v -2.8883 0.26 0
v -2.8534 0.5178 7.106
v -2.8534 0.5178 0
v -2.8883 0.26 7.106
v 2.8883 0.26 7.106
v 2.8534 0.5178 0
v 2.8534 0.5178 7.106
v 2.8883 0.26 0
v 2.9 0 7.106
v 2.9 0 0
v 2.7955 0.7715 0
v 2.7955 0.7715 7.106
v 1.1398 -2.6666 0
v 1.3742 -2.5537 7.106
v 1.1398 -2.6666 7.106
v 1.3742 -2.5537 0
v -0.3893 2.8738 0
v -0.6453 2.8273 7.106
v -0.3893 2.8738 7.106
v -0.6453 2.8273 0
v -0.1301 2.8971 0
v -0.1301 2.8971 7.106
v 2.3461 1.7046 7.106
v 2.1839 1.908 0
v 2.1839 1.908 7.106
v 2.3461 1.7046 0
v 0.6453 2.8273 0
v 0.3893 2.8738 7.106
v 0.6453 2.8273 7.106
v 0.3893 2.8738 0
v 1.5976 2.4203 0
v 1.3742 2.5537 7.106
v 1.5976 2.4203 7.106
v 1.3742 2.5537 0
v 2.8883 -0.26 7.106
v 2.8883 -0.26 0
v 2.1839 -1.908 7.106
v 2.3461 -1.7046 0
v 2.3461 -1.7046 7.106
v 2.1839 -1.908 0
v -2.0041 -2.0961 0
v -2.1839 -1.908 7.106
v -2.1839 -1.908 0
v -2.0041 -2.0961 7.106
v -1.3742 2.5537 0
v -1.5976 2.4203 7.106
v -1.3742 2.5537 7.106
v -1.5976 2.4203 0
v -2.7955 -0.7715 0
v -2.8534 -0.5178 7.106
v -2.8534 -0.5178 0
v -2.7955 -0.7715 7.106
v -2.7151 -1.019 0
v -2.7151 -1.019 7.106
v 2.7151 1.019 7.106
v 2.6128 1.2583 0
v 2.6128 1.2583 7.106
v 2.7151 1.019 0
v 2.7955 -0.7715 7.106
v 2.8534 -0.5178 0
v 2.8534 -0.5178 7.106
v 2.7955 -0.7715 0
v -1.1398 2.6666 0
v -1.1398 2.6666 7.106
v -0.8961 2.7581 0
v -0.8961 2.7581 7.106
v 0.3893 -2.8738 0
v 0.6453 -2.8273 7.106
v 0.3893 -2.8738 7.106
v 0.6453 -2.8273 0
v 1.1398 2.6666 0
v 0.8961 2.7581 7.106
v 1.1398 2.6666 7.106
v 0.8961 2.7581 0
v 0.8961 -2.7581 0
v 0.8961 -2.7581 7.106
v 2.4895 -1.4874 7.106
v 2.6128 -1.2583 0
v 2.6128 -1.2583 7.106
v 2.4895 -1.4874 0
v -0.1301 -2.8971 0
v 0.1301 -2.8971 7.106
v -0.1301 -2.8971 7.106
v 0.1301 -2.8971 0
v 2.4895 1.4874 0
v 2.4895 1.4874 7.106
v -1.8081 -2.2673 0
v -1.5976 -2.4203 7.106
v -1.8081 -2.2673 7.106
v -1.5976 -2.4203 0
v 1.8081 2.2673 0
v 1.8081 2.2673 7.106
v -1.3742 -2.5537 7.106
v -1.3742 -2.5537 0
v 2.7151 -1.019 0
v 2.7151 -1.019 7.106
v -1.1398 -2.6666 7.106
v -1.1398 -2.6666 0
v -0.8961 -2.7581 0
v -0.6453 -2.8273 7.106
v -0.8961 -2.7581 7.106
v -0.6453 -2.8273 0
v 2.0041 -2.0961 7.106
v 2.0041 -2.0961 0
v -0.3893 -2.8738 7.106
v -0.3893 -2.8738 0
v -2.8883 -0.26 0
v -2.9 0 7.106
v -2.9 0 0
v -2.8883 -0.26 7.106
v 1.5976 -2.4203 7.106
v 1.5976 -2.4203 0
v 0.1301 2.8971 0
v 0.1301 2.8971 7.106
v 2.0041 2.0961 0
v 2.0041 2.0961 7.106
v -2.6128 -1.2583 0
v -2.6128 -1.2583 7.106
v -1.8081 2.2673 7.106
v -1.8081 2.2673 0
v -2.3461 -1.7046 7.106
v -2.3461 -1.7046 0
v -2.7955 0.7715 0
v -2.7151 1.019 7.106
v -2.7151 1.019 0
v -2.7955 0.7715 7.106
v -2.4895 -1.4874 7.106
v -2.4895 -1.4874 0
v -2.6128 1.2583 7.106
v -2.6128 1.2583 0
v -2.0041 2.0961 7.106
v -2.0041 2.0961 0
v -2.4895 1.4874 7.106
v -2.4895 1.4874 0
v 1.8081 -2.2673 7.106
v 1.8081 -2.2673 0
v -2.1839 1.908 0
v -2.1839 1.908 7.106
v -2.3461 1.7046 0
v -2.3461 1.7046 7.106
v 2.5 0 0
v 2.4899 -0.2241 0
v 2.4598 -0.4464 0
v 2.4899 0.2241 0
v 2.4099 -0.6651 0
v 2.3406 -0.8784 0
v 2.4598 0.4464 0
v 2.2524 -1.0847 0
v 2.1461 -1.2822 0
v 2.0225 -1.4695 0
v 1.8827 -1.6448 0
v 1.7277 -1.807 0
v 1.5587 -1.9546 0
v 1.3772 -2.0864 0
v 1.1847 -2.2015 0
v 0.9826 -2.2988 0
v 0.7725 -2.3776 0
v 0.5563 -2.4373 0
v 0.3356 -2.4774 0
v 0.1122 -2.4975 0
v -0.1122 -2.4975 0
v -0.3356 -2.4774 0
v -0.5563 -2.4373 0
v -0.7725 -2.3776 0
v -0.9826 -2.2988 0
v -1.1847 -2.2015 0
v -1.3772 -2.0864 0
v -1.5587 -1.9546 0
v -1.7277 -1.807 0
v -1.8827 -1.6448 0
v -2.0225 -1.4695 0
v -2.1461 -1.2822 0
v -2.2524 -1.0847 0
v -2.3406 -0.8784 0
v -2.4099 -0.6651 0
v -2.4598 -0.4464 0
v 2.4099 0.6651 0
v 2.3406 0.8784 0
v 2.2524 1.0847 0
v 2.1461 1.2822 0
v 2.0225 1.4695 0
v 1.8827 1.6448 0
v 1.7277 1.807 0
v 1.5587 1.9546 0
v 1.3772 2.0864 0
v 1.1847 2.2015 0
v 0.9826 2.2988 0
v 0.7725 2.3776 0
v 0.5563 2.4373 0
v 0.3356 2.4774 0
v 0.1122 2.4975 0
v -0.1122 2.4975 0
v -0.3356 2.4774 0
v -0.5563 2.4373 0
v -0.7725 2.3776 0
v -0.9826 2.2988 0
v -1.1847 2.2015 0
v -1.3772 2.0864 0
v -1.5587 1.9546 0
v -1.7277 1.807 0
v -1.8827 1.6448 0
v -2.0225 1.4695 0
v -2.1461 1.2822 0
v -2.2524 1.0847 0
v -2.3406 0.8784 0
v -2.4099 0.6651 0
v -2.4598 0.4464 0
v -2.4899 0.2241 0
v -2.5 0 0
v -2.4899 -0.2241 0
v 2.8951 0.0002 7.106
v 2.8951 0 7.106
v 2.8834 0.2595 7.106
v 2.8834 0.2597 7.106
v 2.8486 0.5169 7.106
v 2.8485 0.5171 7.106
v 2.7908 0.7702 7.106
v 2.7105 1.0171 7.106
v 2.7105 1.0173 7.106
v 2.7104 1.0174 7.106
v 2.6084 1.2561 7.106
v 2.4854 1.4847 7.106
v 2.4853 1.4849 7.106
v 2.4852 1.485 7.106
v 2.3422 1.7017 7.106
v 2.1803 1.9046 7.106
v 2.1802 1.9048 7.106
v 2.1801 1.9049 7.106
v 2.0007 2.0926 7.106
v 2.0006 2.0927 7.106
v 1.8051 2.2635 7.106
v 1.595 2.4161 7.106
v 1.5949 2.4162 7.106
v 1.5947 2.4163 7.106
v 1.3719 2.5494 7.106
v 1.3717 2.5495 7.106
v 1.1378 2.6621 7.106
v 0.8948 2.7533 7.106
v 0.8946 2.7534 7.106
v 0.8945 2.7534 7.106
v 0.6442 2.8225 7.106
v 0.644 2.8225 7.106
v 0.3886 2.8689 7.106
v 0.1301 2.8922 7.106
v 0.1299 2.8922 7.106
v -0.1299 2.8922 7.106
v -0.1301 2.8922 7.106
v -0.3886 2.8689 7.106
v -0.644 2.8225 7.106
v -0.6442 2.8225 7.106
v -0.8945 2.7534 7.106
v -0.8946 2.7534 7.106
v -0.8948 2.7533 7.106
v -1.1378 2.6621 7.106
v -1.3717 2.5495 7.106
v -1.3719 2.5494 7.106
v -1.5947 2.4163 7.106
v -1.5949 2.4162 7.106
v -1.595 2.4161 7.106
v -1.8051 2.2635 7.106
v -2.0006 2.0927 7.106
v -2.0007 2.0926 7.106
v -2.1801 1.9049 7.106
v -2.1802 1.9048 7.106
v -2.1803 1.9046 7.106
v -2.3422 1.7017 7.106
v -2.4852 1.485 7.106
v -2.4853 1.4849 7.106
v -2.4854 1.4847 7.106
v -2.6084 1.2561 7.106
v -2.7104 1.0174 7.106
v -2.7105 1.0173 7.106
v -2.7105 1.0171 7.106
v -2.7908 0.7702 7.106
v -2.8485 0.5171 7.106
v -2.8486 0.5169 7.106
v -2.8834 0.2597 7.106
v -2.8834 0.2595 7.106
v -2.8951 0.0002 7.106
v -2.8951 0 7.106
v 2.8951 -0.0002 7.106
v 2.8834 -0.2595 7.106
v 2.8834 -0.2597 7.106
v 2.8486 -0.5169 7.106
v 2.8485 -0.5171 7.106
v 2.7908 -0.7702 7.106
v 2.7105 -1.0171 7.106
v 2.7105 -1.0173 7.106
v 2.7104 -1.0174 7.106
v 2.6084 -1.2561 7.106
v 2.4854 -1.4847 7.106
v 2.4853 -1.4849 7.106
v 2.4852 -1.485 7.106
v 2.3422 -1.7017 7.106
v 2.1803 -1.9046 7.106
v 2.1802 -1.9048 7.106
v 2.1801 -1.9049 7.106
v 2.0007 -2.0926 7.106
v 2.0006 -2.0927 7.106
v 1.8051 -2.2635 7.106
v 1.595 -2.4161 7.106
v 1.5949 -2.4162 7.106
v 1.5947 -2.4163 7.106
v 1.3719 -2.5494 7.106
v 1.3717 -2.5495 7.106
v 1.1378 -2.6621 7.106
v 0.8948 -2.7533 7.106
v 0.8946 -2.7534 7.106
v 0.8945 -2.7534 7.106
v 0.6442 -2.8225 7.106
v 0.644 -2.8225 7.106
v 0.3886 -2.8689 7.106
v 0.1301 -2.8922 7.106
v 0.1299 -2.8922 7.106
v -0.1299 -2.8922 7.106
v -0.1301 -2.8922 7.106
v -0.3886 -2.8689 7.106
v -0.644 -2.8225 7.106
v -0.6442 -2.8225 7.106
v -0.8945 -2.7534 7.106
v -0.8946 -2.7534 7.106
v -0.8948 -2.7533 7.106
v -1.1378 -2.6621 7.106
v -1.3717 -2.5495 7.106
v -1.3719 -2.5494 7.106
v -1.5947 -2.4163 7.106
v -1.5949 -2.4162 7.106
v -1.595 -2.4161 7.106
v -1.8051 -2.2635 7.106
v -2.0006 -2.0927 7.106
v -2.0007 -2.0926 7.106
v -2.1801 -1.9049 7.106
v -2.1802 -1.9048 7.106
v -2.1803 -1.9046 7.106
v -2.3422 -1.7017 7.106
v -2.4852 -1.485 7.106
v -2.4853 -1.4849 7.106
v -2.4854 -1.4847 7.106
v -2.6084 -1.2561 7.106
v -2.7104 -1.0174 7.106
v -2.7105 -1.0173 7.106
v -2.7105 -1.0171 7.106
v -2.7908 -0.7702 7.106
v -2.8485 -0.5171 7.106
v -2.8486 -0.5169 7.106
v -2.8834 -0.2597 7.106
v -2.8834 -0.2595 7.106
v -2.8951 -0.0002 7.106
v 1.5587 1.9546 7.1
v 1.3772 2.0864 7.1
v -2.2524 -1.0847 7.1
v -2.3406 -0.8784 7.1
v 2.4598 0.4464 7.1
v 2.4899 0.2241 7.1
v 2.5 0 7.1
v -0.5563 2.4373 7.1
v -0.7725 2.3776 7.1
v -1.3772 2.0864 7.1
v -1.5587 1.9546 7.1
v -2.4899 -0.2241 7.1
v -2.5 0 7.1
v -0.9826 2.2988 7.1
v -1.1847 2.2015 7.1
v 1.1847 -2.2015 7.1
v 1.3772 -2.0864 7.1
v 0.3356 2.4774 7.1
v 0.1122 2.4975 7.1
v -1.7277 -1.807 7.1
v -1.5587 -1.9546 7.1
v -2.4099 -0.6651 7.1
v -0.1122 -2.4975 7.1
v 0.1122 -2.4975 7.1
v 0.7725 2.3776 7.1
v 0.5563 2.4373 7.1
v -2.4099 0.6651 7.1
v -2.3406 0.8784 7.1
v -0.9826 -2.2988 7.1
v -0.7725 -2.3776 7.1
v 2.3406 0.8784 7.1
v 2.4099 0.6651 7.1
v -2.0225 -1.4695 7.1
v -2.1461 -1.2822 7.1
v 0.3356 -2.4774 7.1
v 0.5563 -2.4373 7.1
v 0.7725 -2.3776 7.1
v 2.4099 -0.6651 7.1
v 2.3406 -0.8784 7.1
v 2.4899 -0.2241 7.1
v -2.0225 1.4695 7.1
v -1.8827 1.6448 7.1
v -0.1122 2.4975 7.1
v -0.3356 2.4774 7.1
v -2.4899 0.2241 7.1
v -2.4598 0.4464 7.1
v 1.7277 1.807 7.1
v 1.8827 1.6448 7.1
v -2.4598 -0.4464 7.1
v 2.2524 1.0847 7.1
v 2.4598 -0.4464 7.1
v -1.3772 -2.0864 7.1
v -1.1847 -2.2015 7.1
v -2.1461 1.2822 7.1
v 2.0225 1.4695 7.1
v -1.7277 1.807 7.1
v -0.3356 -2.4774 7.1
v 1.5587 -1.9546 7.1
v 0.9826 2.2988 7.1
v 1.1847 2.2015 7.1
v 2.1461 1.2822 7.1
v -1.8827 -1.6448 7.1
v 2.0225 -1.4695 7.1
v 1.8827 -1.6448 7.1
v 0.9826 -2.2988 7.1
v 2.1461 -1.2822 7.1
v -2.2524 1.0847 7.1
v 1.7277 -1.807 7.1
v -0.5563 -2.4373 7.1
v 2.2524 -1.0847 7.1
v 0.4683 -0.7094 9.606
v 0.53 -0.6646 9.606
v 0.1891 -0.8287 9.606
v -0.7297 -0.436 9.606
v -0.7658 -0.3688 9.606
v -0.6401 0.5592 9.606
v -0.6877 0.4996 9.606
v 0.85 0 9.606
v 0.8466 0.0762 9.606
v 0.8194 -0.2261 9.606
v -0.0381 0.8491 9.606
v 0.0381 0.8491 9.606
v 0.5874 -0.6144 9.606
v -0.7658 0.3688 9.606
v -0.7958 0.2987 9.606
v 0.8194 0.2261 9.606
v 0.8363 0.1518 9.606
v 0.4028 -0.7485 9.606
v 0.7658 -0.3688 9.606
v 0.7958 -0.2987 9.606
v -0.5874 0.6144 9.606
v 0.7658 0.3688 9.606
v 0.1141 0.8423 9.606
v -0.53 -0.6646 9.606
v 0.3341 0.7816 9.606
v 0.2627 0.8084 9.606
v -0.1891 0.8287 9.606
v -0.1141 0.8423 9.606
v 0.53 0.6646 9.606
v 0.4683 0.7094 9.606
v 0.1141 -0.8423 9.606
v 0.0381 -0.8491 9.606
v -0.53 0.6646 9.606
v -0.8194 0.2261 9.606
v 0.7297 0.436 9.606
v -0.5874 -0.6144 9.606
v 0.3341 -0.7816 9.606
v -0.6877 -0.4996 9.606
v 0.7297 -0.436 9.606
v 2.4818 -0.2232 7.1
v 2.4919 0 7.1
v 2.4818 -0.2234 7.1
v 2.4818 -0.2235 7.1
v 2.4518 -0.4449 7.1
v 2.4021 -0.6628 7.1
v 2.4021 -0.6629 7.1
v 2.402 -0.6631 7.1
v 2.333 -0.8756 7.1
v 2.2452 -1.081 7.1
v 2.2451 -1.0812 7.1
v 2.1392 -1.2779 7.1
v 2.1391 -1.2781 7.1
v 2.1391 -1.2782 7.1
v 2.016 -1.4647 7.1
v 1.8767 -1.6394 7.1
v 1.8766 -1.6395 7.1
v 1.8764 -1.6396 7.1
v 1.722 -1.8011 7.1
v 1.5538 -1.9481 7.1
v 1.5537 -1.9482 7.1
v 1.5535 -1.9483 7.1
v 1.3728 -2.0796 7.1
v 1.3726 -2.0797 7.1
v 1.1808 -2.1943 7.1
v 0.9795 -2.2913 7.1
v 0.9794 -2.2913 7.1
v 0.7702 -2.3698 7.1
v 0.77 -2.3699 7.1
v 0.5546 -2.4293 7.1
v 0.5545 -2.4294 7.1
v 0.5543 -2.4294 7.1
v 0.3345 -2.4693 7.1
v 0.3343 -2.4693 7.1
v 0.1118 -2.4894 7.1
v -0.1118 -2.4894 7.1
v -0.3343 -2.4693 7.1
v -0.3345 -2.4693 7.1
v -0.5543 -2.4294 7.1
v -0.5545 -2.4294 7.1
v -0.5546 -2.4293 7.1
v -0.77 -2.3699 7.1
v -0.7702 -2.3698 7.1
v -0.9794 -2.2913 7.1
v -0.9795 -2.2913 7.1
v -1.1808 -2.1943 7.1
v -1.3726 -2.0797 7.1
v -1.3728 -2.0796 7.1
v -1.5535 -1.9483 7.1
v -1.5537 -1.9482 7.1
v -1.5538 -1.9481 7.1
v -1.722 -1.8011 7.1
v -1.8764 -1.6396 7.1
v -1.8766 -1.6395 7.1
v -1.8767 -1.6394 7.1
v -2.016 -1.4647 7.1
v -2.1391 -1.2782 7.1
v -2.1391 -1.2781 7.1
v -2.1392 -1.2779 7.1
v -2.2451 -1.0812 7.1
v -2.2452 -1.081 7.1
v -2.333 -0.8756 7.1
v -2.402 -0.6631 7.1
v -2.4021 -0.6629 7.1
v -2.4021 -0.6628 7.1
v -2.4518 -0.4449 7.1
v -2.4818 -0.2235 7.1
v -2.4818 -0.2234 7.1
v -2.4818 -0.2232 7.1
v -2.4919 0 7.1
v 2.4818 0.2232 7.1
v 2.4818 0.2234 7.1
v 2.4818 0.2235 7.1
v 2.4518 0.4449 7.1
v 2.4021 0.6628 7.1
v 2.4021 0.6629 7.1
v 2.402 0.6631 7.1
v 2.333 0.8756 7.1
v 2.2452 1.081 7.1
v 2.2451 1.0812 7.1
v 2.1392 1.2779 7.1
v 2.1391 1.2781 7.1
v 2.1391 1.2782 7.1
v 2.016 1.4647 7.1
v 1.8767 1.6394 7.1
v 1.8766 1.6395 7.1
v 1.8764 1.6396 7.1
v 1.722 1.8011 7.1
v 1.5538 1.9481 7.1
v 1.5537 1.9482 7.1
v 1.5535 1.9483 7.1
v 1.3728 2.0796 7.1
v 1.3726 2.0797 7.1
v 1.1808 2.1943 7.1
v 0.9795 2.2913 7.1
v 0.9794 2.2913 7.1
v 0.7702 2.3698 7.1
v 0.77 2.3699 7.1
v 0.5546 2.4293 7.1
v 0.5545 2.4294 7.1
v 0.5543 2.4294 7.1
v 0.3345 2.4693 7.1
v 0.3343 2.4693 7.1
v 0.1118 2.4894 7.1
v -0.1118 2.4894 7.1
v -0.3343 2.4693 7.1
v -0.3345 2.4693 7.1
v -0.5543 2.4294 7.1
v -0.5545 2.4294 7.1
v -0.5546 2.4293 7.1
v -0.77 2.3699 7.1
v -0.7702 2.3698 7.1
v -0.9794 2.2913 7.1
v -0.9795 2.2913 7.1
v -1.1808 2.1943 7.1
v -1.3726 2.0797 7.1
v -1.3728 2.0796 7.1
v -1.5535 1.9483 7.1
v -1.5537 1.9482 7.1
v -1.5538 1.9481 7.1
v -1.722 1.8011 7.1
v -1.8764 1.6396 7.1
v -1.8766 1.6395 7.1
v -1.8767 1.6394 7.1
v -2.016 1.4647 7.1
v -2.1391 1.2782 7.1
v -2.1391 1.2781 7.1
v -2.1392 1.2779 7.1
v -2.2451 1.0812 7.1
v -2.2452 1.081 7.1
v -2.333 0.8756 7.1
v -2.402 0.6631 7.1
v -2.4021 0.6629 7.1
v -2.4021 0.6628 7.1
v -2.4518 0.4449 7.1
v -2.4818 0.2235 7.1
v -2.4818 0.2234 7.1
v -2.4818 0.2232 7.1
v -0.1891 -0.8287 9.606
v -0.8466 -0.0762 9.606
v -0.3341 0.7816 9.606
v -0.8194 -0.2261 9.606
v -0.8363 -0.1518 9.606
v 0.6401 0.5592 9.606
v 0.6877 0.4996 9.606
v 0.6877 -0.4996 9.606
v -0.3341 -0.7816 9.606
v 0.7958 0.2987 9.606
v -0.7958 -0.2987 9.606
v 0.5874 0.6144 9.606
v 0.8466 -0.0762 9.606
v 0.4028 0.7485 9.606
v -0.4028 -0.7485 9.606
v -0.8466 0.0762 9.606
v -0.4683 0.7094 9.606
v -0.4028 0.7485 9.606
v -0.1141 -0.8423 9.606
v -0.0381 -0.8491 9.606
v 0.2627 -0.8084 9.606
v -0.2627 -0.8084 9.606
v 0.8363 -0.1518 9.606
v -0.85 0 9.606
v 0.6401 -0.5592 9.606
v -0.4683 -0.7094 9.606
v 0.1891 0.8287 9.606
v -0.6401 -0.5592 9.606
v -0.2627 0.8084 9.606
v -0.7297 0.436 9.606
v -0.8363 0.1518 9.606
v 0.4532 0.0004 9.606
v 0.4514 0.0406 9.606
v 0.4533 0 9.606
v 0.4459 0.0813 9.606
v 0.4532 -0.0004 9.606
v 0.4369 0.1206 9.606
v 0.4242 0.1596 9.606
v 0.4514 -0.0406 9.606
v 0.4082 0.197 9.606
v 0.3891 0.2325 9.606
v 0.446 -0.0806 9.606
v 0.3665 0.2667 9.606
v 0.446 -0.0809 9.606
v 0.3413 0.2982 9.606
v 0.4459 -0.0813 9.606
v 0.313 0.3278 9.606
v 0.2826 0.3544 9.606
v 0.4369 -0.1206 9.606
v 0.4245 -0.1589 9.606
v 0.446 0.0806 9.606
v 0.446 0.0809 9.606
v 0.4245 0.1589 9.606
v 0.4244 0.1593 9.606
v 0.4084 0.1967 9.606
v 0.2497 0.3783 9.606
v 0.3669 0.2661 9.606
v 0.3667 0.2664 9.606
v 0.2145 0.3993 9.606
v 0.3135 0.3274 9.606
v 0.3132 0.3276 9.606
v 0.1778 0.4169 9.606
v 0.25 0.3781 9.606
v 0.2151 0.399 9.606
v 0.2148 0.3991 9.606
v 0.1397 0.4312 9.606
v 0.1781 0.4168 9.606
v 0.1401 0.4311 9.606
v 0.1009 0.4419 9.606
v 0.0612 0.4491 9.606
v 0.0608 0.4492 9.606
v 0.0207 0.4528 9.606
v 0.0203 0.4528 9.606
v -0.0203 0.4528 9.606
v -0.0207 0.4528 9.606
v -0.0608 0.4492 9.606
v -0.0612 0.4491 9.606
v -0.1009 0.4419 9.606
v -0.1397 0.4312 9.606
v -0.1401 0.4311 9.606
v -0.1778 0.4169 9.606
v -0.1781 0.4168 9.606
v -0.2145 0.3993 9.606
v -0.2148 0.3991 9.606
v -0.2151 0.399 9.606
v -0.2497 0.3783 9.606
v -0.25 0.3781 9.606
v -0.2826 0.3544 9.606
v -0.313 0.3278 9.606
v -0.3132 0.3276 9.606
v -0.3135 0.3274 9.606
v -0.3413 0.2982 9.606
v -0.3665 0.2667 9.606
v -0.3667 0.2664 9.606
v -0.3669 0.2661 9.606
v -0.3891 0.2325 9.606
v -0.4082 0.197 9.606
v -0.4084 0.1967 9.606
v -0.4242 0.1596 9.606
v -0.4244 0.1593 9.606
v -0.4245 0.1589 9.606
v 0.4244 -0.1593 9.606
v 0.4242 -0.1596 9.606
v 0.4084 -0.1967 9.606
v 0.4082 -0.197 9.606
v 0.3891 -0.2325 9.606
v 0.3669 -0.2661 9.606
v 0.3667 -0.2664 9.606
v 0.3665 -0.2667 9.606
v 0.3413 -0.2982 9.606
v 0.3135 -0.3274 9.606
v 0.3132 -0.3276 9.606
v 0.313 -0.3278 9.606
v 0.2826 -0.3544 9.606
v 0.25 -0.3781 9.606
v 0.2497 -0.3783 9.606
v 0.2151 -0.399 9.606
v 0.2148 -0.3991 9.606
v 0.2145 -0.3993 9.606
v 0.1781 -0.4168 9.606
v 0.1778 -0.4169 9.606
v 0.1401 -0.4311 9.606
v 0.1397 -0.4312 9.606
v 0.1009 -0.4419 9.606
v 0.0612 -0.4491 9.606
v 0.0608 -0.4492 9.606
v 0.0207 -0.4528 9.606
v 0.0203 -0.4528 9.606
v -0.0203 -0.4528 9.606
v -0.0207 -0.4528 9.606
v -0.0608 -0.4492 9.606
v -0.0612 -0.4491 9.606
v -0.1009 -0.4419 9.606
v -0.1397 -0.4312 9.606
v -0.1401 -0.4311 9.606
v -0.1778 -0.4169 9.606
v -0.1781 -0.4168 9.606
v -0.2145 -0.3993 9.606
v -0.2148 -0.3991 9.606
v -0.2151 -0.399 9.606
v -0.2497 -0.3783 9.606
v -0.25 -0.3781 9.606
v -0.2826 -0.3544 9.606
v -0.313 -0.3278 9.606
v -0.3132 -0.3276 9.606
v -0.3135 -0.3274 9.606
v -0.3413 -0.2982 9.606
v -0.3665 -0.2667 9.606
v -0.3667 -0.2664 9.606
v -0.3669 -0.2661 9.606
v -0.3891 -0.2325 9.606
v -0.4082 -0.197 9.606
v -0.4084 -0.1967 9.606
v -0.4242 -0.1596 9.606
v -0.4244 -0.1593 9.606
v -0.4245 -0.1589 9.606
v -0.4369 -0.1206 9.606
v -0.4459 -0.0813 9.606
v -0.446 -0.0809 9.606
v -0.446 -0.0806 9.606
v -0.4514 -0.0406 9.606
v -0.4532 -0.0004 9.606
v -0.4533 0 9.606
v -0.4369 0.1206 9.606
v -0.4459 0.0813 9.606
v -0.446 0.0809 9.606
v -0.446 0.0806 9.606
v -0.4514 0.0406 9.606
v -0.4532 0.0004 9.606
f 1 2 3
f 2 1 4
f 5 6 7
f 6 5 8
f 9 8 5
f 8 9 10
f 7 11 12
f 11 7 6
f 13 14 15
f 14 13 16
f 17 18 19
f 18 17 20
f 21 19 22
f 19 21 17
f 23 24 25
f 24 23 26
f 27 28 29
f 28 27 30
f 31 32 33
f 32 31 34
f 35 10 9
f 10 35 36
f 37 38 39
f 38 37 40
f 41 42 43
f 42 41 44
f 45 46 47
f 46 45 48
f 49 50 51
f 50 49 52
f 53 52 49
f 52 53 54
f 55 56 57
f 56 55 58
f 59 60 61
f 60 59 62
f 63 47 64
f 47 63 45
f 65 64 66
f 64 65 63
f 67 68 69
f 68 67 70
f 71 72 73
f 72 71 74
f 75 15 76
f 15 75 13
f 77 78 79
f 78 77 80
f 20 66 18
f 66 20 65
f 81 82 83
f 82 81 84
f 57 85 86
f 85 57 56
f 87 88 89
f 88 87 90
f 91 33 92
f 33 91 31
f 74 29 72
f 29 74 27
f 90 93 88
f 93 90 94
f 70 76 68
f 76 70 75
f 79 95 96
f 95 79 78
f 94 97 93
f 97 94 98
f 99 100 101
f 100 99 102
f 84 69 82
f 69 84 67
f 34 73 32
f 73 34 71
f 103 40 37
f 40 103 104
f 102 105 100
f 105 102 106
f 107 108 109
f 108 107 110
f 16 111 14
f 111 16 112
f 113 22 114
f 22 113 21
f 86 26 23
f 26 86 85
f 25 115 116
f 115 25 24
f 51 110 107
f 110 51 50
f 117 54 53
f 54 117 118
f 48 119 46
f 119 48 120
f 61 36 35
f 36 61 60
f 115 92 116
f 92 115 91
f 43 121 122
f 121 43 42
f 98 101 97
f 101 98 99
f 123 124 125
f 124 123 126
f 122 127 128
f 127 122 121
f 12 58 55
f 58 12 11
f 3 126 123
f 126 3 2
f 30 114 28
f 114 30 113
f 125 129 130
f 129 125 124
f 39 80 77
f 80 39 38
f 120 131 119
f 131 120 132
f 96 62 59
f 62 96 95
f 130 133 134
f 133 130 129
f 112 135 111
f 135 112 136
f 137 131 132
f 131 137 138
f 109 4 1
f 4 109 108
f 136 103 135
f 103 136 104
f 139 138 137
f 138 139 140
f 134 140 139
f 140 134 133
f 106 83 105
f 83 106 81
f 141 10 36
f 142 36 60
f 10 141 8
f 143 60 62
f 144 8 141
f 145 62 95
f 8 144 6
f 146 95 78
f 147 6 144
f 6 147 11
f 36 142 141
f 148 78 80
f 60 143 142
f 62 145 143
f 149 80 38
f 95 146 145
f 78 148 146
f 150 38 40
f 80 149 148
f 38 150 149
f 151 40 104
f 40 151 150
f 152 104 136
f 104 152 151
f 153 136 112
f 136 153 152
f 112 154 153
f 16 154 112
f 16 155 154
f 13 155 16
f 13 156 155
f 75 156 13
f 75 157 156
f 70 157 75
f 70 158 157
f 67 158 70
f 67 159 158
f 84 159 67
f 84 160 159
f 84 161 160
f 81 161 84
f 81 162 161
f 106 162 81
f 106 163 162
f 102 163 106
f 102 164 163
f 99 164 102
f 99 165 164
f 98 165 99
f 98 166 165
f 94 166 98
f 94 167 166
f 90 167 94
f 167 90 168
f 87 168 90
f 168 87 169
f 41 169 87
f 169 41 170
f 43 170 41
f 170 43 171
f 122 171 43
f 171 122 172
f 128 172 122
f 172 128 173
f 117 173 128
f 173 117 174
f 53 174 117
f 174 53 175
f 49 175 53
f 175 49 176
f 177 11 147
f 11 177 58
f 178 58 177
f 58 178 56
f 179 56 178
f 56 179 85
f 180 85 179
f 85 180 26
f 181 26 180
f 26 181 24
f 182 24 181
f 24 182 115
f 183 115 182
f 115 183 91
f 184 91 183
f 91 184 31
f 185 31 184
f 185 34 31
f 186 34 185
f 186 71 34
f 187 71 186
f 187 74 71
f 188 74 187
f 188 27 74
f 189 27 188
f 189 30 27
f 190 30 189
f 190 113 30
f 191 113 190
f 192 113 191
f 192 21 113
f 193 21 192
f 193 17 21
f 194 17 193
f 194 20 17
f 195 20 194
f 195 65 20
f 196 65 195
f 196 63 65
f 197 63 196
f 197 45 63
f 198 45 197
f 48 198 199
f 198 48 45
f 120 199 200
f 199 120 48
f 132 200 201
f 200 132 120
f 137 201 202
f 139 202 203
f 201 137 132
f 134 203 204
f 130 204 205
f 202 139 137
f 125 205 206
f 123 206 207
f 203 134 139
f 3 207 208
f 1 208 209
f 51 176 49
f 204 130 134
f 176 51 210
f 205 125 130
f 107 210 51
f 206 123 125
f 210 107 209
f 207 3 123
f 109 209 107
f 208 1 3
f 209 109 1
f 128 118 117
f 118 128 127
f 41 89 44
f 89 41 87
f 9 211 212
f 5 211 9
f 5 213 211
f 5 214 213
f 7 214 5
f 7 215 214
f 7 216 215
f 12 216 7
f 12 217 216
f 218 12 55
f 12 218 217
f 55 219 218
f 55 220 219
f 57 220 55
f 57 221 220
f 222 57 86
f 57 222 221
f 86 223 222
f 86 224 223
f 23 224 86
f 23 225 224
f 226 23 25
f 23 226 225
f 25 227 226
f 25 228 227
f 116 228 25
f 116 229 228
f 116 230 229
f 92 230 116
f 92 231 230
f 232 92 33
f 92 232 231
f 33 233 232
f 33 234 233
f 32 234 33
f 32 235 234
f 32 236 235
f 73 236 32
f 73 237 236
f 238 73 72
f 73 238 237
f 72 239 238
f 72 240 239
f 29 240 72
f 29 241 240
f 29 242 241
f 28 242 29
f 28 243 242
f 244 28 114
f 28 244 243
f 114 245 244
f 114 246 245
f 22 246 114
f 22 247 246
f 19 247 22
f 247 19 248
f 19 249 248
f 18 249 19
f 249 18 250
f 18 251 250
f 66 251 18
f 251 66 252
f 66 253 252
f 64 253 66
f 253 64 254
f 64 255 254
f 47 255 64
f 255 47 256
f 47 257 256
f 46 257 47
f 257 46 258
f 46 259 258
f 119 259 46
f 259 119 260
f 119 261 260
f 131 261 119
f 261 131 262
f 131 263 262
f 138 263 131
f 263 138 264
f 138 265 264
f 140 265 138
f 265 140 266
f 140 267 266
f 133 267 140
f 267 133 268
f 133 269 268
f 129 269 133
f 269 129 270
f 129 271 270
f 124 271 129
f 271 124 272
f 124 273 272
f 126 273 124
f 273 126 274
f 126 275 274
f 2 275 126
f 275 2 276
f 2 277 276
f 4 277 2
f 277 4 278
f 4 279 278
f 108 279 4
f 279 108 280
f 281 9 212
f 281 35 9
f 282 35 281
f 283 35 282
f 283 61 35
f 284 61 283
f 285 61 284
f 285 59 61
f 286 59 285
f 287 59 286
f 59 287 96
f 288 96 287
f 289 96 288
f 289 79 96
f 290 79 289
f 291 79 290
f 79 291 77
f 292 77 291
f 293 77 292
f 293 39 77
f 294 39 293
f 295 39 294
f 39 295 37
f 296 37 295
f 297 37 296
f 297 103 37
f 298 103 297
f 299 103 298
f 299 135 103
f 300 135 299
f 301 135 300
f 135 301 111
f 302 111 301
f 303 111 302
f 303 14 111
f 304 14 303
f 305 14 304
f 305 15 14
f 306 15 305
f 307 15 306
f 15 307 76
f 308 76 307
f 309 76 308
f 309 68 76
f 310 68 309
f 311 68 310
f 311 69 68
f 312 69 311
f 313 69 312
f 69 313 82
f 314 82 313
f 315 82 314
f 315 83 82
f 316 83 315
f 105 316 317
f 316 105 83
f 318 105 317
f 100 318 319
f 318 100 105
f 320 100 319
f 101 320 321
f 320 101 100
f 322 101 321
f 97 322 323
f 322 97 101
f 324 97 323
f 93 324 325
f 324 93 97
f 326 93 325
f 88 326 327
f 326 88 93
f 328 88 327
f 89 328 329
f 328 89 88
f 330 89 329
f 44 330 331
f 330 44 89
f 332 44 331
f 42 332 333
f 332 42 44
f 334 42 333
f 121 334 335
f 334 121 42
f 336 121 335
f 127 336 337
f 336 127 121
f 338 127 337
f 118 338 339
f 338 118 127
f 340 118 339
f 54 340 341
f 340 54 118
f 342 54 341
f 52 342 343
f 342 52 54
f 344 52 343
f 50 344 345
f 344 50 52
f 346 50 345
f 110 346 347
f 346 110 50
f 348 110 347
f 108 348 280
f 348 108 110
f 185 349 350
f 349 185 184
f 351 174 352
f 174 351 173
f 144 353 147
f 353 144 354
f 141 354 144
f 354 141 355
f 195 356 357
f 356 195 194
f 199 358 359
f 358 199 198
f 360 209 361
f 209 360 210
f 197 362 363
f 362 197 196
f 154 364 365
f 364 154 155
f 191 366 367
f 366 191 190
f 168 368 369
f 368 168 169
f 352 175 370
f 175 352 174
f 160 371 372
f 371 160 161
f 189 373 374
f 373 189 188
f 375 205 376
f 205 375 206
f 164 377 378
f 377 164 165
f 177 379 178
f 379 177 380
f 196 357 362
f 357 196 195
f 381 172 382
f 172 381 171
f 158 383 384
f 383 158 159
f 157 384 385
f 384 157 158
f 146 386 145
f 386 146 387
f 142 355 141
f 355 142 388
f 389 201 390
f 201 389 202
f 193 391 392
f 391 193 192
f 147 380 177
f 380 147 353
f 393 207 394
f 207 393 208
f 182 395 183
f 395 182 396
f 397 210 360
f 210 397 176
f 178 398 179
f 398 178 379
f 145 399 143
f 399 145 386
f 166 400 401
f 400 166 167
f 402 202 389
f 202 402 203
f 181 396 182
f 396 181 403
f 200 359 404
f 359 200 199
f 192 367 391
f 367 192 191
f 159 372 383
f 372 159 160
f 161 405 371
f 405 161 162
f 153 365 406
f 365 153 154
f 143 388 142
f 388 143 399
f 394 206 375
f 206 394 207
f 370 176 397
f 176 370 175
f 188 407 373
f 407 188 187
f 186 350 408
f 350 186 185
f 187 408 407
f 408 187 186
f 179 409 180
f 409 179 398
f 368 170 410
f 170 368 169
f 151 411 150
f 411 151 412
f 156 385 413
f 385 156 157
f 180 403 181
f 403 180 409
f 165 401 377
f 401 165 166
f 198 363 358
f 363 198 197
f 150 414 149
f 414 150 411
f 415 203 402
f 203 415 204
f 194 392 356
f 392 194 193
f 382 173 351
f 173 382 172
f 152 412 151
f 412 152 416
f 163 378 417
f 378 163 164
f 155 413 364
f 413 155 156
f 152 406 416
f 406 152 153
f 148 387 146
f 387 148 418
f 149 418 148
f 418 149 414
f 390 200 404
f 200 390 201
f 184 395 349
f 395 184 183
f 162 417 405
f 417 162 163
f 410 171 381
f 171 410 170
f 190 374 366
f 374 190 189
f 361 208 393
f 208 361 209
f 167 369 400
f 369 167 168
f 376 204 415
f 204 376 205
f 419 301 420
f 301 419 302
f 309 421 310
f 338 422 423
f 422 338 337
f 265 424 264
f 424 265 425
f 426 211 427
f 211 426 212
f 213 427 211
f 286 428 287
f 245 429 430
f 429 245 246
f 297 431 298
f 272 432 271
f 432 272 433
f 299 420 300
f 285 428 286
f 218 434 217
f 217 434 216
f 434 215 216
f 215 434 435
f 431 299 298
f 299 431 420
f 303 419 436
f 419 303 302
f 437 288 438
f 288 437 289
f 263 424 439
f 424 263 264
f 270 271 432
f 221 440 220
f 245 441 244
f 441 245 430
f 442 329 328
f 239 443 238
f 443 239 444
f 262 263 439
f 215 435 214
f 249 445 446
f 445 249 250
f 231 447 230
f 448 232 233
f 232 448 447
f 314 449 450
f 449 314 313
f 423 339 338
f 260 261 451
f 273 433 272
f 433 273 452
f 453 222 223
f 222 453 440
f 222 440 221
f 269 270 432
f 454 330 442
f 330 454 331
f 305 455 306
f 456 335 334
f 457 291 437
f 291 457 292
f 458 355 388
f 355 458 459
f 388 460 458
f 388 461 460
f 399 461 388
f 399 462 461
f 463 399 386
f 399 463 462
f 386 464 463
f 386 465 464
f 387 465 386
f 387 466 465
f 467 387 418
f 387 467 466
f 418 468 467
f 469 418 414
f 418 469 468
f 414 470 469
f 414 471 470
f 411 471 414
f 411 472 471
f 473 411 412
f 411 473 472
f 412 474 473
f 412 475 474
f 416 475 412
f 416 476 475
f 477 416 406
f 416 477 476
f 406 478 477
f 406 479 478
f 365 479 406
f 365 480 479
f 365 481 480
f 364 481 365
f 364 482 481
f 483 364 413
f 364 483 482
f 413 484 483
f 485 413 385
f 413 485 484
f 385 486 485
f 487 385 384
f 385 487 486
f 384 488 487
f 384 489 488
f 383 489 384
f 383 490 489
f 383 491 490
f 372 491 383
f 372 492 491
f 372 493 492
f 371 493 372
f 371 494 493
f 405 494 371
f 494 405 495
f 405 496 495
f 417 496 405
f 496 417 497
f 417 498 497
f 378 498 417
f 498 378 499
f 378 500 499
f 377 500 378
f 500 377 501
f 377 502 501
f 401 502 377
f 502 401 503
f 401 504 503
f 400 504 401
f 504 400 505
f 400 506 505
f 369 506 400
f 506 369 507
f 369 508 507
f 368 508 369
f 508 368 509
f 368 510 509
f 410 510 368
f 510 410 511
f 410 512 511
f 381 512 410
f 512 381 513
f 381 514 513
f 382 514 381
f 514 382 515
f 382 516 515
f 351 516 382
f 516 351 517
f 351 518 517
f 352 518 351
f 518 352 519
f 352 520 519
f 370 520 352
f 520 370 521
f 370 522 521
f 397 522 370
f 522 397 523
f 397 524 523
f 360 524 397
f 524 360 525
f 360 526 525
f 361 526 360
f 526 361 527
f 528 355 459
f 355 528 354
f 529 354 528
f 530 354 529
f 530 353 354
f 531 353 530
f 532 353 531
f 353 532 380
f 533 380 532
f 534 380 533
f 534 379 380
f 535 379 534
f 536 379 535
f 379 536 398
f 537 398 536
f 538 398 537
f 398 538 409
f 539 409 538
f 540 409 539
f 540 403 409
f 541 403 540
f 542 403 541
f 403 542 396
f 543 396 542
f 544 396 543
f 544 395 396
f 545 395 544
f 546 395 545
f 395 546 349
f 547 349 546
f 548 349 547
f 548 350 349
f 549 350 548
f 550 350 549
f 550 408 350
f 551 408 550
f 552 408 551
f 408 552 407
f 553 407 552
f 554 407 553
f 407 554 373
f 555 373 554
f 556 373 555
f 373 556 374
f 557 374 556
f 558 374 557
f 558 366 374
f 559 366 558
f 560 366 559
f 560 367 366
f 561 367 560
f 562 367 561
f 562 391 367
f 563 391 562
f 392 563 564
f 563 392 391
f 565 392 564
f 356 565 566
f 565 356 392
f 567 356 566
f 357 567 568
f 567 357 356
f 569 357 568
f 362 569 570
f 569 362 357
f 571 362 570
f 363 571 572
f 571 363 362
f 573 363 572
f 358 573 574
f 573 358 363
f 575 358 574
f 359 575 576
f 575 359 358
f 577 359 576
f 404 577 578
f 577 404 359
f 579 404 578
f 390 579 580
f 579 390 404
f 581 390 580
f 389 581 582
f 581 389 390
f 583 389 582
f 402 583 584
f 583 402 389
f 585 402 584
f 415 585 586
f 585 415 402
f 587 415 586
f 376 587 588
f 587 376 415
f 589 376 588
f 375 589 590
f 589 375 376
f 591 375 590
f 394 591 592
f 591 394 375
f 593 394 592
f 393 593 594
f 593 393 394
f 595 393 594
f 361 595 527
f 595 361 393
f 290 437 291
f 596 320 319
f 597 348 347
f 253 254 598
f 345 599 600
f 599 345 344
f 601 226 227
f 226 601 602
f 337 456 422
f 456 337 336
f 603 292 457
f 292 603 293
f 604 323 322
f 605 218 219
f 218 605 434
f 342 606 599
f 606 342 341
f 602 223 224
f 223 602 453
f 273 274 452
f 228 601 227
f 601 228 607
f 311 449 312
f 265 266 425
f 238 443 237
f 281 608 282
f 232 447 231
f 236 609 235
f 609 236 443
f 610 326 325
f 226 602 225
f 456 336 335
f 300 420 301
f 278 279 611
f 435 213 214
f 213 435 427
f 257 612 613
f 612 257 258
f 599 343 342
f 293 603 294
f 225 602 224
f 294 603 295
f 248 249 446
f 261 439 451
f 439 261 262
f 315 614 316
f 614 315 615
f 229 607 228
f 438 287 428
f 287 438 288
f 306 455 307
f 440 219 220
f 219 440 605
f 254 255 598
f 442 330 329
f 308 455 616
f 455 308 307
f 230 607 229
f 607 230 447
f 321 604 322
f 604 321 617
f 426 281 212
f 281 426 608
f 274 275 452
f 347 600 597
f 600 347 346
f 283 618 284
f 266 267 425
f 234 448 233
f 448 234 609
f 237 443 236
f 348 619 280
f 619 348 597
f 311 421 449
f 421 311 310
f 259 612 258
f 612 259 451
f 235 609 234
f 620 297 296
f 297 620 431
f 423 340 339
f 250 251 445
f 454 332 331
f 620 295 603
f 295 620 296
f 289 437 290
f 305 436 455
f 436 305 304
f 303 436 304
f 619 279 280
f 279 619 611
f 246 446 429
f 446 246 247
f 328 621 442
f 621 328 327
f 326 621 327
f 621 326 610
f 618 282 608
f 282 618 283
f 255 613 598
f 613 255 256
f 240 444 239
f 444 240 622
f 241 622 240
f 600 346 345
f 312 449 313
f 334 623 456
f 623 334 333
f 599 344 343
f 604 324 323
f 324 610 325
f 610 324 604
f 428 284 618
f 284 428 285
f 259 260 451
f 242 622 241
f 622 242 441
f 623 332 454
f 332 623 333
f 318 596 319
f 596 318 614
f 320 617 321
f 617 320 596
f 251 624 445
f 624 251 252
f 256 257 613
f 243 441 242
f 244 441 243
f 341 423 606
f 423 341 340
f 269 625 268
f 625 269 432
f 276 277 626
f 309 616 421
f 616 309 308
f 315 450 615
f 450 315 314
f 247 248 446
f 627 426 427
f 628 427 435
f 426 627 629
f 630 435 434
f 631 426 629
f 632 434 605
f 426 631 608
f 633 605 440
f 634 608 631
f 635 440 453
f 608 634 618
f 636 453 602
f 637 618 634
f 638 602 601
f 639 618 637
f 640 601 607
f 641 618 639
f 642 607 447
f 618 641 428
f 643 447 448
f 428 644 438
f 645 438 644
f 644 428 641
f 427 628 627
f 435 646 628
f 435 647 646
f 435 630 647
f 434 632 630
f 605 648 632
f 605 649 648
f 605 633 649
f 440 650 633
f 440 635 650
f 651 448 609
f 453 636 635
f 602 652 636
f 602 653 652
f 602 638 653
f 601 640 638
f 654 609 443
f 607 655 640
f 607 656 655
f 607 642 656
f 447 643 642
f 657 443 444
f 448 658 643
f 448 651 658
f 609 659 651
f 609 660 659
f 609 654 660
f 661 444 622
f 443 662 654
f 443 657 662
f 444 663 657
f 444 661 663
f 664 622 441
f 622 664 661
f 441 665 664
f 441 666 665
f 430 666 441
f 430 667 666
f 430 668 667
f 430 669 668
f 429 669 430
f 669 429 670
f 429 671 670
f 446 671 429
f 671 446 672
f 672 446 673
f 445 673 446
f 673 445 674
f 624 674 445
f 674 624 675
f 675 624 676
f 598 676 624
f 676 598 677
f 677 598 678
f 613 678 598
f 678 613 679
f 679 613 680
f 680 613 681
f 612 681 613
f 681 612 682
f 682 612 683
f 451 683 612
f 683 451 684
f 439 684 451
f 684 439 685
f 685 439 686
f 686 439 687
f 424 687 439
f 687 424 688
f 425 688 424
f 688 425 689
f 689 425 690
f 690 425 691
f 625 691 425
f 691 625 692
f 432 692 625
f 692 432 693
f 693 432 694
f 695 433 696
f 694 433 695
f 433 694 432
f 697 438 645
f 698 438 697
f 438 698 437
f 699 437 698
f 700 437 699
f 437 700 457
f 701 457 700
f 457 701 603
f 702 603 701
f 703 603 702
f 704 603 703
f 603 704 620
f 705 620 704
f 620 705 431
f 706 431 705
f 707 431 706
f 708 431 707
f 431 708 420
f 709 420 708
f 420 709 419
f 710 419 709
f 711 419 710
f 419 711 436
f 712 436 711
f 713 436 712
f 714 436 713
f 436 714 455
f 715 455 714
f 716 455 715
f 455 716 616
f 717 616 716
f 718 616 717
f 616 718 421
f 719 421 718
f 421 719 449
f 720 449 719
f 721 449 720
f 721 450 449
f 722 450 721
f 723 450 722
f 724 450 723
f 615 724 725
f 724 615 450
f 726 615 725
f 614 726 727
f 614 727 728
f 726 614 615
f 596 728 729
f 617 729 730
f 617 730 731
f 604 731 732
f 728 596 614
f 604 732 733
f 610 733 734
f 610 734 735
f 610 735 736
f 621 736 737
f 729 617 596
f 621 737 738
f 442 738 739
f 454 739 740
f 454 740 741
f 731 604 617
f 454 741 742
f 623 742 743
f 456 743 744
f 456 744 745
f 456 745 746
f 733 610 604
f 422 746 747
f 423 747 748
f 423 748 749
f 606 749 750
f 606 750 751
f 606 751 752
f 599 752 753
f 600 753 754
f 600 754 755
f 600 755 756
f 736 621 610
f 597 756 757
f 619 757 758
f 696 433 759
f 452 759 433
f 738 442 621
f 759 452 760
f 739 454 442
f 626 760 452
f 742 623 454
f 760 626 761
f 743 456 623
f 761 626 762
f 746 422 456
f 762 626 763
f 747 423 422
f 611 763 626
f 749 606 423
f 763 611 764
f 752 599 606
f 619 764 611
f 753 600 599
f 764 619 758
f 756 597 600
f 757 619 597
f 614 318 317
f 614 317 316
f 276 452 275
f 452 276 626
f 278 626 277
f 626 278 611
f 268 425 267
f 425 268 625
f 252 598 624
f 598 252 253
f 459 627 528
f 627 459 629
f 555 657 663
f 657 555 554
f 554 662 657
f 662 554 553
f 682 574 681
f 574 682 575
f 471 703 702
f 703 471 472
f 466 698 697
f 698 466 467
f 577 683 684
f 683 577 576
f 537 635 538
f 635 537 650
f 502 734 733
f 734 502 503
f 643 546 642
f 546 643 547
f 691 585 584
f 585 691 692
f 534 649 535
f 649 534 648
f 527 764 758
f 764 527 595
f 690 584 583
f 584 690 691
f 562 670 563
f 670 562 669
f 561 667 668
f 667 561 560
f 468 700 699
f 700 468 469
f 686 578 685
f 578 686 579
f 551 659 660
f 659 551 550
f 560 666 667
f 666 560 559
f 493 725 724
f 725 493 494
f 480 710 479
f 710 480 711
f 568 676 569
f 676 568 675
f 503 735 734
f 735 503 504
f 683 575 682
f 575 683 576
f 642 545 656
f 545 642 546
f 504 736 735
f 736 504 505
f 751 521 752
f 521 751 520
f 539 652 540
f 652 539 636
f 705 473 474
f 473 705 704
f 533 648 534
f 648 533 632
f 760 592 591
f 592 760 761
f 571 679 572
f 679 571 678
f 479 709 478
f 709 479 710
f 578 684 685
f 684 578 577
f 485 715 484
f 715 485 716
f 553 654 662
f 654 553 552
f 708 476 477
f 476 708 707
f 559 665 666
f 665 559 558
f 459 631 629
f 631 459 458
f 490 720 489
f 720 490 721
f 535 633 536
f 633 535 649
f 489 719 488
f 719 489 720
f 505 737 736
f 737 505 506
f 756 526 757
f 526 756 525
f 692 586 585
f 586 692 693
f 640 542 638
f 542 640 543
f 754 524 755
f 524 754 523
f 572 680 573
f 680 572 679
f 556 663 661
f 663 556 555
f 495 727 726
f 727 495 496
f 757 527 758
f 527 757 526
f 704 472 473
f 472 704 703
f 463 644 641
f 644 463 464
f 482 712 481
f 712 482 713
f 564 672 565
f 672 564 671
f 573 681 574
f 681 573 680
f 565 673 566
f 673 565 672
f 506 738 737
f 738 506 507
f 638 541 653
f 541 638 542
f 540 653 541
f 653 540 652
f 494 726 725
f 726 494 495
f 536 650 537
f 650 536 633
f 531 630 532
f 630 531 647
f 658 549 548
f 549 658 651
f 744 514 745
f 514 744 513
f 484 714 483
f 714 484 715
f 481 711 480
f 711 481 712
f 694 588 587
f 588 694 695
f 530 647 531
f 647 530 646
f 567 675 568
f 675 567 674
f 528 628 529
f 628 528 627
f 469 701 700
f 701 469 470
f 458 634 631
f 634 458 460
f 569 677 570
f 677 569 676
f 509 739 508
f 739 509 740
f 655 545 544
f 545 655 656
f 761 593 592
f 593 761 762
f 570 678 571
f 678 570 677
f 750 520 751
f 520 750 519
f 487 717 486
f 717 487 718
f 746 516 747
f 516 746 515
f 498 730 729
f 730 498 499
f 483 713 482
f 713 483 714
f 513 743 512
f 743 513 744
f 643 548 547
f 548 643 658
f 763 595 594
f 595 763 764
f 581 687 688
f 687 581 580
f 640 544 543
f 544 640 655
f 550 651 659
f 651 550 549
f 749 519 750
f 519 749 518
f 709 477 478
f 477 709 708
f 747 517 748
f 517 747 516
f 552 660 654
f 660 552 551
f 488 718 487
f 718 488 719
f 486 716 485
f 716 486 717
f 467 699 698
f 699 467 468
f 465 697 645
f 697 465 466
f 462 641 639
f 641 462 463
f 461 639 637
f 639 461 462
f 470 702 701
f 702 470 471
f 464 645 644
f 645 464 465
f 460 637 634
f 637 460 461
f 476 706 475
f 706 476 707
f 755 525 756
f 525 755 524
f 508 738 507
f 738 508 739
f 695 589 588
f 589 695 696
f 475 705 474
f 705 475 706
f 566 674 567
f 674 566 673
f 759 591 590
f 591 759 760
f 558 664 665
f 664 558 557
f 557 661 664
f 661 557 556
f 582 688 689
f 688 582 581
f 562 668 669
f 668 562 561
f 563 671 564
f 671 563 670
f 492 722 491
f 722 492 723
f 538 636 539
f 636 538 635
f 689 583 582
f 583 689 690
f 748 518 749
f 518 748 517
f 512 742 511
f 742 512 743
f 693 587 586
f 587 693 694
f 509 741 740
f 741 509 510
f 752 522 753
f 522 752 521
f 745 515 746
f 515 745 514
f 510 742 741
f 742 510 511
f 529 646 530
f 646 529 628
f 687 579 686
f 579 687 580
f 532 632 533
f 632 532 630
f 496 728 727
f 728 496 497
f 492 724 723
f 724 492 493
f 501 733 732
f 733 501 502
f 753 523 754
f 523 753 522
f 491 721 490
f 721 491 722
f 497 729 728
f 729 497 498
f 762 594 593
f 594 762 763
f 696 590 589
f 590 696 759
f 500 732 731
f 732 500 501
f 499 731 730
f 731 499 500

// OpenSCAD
// file: ProbeTipCoverLib.scad
////////////////////////////////////////////////////////////////
// Scope probe tip protection
// By Nuno João from https://EmbeddedDreams.com
// Released 2020 under Creative Commons 3.0
//
// This creates a cover to protect a scope's probe tip from
// shorting to nearby components when probing a board.
// Scope probes include this accessory, but it can be lost,
// and is tipically larger than I would like them to be...
//


// Parameter defaults are for Rigol RP2200 probes.
module ProbeTipCover (
        InnerDiameter = 5.00,
        BodyLength = 7.10,
        ConeLength = 2.50,
        TipLength = 0.00,
        TipHoleDiameter = 0.90,
        WallThickness = 0.4
)  {
    // Precalcs and other constants
    cType = 0;
    cHeight = 1;
    cDiameter = 2;
    cPreviousDiameter = 3;
    cSmoothness = 70;

    // Tip definition, by vertical segments. Types:
    //  0: cylinder
    //  1: cone, a linear transition between 2 adjacent segments
    //  2: flat, diameter is a center hole's diameter
    cSegments = [
    //  type  height       in/hole-diam      prevDiam
        [ 0,  BodyLength,  InnerDiameter                   ],
        [ 1,  ConeLength,  TipHoleDiameter,  InnerDiameter ],
        [ 0,   TipLength,  TipHoleDiameter                 ],
    ];

    // OpenSCAD's stupid concept of "variable" forces me to this (and more):
    function GetBaseHeight(idx) =
        idx < 0 ?
            0 :
            (cSegments[idx][cHeight] + GetBaseHeight(idx - 1));

    limit = len(cSegments) - 1;
    for (idx = [0 : limit])  {
        section = cSegments[idx];
        type = section[cType];
        height = section[cHeight];
        diameter = section[cDiameter];
        fn = cSmoothness;

        if (height > 0.0)  {
            if (type == 0)  {
                translate([0, 0, GetBaseHeight(idx-1)])
                    difference()  {
                        cylinder(h = height+0.006, d = diameter + WallThickness*2, $fn=fn);
                        translate([0, 0, -0.01])
                            cylinder(h = height * 0.01 + 0.02, d = diameter, $fn=fn);
                            cylinder(h = height + 0.02, d = diameter, $fn=fn);
                    }
            }
            else if (type == 1)  {
                prevDiam = section[cPreviousDiameter];
                outDiam = diameter + WallThickness*2;
                outPrevDiam = prevDiam + WallThickness*2;
                translate([0, 0, GetBaseHeight(idx-1)])
                    difference()  {
                        cylinder(h = height+0.006, d1 = outPrevDiam, d2 = outDiam, $fn=fn);
                        translate([0, 0, -0.01])
                            cylinder(h = height + 0.02, d1 = prevDiam,
                                                        d2 = diameter, $fn=fn);
                    }
            }
            else if (type == 2)  {
                holeDiam = section[cDiameter2];
                echo("hole diam: ", holeDiam);
                translate([0, 0, GetBaseHeight(idx-1) - WallThickness])
                    difference()  {
                        // The flat top slab
                        cylinder(h = WallThickness+0.006, d = diameter + 0.6, $fn=fn);
                        // Hole in the center
                        translate([0, 0, -0.005])
                            cylinder(h = WallThickness*2 + 0.01, d = holeDiam, $fn=fn);
                    }
            }
            else  {
                echo("***** UPS!! Unkonwn type!");
            }
        }
    }
}


/// Test
//ProbeTipCover();
// main file
include <ProbeTipCoverLib.scad>;

// Build it!
// Note: InnerDiameter should be 4.7 - 4.8, but it simply doesn't fit,
// maybe something with my printer.
ProbeTipCover(
        InnerDiameter = 5.00,
        BodyLength = 7.10,
        ConeLength = 2.50,
        TipLength = 0.00,
        TipHoleDiameter = 0.90
);
